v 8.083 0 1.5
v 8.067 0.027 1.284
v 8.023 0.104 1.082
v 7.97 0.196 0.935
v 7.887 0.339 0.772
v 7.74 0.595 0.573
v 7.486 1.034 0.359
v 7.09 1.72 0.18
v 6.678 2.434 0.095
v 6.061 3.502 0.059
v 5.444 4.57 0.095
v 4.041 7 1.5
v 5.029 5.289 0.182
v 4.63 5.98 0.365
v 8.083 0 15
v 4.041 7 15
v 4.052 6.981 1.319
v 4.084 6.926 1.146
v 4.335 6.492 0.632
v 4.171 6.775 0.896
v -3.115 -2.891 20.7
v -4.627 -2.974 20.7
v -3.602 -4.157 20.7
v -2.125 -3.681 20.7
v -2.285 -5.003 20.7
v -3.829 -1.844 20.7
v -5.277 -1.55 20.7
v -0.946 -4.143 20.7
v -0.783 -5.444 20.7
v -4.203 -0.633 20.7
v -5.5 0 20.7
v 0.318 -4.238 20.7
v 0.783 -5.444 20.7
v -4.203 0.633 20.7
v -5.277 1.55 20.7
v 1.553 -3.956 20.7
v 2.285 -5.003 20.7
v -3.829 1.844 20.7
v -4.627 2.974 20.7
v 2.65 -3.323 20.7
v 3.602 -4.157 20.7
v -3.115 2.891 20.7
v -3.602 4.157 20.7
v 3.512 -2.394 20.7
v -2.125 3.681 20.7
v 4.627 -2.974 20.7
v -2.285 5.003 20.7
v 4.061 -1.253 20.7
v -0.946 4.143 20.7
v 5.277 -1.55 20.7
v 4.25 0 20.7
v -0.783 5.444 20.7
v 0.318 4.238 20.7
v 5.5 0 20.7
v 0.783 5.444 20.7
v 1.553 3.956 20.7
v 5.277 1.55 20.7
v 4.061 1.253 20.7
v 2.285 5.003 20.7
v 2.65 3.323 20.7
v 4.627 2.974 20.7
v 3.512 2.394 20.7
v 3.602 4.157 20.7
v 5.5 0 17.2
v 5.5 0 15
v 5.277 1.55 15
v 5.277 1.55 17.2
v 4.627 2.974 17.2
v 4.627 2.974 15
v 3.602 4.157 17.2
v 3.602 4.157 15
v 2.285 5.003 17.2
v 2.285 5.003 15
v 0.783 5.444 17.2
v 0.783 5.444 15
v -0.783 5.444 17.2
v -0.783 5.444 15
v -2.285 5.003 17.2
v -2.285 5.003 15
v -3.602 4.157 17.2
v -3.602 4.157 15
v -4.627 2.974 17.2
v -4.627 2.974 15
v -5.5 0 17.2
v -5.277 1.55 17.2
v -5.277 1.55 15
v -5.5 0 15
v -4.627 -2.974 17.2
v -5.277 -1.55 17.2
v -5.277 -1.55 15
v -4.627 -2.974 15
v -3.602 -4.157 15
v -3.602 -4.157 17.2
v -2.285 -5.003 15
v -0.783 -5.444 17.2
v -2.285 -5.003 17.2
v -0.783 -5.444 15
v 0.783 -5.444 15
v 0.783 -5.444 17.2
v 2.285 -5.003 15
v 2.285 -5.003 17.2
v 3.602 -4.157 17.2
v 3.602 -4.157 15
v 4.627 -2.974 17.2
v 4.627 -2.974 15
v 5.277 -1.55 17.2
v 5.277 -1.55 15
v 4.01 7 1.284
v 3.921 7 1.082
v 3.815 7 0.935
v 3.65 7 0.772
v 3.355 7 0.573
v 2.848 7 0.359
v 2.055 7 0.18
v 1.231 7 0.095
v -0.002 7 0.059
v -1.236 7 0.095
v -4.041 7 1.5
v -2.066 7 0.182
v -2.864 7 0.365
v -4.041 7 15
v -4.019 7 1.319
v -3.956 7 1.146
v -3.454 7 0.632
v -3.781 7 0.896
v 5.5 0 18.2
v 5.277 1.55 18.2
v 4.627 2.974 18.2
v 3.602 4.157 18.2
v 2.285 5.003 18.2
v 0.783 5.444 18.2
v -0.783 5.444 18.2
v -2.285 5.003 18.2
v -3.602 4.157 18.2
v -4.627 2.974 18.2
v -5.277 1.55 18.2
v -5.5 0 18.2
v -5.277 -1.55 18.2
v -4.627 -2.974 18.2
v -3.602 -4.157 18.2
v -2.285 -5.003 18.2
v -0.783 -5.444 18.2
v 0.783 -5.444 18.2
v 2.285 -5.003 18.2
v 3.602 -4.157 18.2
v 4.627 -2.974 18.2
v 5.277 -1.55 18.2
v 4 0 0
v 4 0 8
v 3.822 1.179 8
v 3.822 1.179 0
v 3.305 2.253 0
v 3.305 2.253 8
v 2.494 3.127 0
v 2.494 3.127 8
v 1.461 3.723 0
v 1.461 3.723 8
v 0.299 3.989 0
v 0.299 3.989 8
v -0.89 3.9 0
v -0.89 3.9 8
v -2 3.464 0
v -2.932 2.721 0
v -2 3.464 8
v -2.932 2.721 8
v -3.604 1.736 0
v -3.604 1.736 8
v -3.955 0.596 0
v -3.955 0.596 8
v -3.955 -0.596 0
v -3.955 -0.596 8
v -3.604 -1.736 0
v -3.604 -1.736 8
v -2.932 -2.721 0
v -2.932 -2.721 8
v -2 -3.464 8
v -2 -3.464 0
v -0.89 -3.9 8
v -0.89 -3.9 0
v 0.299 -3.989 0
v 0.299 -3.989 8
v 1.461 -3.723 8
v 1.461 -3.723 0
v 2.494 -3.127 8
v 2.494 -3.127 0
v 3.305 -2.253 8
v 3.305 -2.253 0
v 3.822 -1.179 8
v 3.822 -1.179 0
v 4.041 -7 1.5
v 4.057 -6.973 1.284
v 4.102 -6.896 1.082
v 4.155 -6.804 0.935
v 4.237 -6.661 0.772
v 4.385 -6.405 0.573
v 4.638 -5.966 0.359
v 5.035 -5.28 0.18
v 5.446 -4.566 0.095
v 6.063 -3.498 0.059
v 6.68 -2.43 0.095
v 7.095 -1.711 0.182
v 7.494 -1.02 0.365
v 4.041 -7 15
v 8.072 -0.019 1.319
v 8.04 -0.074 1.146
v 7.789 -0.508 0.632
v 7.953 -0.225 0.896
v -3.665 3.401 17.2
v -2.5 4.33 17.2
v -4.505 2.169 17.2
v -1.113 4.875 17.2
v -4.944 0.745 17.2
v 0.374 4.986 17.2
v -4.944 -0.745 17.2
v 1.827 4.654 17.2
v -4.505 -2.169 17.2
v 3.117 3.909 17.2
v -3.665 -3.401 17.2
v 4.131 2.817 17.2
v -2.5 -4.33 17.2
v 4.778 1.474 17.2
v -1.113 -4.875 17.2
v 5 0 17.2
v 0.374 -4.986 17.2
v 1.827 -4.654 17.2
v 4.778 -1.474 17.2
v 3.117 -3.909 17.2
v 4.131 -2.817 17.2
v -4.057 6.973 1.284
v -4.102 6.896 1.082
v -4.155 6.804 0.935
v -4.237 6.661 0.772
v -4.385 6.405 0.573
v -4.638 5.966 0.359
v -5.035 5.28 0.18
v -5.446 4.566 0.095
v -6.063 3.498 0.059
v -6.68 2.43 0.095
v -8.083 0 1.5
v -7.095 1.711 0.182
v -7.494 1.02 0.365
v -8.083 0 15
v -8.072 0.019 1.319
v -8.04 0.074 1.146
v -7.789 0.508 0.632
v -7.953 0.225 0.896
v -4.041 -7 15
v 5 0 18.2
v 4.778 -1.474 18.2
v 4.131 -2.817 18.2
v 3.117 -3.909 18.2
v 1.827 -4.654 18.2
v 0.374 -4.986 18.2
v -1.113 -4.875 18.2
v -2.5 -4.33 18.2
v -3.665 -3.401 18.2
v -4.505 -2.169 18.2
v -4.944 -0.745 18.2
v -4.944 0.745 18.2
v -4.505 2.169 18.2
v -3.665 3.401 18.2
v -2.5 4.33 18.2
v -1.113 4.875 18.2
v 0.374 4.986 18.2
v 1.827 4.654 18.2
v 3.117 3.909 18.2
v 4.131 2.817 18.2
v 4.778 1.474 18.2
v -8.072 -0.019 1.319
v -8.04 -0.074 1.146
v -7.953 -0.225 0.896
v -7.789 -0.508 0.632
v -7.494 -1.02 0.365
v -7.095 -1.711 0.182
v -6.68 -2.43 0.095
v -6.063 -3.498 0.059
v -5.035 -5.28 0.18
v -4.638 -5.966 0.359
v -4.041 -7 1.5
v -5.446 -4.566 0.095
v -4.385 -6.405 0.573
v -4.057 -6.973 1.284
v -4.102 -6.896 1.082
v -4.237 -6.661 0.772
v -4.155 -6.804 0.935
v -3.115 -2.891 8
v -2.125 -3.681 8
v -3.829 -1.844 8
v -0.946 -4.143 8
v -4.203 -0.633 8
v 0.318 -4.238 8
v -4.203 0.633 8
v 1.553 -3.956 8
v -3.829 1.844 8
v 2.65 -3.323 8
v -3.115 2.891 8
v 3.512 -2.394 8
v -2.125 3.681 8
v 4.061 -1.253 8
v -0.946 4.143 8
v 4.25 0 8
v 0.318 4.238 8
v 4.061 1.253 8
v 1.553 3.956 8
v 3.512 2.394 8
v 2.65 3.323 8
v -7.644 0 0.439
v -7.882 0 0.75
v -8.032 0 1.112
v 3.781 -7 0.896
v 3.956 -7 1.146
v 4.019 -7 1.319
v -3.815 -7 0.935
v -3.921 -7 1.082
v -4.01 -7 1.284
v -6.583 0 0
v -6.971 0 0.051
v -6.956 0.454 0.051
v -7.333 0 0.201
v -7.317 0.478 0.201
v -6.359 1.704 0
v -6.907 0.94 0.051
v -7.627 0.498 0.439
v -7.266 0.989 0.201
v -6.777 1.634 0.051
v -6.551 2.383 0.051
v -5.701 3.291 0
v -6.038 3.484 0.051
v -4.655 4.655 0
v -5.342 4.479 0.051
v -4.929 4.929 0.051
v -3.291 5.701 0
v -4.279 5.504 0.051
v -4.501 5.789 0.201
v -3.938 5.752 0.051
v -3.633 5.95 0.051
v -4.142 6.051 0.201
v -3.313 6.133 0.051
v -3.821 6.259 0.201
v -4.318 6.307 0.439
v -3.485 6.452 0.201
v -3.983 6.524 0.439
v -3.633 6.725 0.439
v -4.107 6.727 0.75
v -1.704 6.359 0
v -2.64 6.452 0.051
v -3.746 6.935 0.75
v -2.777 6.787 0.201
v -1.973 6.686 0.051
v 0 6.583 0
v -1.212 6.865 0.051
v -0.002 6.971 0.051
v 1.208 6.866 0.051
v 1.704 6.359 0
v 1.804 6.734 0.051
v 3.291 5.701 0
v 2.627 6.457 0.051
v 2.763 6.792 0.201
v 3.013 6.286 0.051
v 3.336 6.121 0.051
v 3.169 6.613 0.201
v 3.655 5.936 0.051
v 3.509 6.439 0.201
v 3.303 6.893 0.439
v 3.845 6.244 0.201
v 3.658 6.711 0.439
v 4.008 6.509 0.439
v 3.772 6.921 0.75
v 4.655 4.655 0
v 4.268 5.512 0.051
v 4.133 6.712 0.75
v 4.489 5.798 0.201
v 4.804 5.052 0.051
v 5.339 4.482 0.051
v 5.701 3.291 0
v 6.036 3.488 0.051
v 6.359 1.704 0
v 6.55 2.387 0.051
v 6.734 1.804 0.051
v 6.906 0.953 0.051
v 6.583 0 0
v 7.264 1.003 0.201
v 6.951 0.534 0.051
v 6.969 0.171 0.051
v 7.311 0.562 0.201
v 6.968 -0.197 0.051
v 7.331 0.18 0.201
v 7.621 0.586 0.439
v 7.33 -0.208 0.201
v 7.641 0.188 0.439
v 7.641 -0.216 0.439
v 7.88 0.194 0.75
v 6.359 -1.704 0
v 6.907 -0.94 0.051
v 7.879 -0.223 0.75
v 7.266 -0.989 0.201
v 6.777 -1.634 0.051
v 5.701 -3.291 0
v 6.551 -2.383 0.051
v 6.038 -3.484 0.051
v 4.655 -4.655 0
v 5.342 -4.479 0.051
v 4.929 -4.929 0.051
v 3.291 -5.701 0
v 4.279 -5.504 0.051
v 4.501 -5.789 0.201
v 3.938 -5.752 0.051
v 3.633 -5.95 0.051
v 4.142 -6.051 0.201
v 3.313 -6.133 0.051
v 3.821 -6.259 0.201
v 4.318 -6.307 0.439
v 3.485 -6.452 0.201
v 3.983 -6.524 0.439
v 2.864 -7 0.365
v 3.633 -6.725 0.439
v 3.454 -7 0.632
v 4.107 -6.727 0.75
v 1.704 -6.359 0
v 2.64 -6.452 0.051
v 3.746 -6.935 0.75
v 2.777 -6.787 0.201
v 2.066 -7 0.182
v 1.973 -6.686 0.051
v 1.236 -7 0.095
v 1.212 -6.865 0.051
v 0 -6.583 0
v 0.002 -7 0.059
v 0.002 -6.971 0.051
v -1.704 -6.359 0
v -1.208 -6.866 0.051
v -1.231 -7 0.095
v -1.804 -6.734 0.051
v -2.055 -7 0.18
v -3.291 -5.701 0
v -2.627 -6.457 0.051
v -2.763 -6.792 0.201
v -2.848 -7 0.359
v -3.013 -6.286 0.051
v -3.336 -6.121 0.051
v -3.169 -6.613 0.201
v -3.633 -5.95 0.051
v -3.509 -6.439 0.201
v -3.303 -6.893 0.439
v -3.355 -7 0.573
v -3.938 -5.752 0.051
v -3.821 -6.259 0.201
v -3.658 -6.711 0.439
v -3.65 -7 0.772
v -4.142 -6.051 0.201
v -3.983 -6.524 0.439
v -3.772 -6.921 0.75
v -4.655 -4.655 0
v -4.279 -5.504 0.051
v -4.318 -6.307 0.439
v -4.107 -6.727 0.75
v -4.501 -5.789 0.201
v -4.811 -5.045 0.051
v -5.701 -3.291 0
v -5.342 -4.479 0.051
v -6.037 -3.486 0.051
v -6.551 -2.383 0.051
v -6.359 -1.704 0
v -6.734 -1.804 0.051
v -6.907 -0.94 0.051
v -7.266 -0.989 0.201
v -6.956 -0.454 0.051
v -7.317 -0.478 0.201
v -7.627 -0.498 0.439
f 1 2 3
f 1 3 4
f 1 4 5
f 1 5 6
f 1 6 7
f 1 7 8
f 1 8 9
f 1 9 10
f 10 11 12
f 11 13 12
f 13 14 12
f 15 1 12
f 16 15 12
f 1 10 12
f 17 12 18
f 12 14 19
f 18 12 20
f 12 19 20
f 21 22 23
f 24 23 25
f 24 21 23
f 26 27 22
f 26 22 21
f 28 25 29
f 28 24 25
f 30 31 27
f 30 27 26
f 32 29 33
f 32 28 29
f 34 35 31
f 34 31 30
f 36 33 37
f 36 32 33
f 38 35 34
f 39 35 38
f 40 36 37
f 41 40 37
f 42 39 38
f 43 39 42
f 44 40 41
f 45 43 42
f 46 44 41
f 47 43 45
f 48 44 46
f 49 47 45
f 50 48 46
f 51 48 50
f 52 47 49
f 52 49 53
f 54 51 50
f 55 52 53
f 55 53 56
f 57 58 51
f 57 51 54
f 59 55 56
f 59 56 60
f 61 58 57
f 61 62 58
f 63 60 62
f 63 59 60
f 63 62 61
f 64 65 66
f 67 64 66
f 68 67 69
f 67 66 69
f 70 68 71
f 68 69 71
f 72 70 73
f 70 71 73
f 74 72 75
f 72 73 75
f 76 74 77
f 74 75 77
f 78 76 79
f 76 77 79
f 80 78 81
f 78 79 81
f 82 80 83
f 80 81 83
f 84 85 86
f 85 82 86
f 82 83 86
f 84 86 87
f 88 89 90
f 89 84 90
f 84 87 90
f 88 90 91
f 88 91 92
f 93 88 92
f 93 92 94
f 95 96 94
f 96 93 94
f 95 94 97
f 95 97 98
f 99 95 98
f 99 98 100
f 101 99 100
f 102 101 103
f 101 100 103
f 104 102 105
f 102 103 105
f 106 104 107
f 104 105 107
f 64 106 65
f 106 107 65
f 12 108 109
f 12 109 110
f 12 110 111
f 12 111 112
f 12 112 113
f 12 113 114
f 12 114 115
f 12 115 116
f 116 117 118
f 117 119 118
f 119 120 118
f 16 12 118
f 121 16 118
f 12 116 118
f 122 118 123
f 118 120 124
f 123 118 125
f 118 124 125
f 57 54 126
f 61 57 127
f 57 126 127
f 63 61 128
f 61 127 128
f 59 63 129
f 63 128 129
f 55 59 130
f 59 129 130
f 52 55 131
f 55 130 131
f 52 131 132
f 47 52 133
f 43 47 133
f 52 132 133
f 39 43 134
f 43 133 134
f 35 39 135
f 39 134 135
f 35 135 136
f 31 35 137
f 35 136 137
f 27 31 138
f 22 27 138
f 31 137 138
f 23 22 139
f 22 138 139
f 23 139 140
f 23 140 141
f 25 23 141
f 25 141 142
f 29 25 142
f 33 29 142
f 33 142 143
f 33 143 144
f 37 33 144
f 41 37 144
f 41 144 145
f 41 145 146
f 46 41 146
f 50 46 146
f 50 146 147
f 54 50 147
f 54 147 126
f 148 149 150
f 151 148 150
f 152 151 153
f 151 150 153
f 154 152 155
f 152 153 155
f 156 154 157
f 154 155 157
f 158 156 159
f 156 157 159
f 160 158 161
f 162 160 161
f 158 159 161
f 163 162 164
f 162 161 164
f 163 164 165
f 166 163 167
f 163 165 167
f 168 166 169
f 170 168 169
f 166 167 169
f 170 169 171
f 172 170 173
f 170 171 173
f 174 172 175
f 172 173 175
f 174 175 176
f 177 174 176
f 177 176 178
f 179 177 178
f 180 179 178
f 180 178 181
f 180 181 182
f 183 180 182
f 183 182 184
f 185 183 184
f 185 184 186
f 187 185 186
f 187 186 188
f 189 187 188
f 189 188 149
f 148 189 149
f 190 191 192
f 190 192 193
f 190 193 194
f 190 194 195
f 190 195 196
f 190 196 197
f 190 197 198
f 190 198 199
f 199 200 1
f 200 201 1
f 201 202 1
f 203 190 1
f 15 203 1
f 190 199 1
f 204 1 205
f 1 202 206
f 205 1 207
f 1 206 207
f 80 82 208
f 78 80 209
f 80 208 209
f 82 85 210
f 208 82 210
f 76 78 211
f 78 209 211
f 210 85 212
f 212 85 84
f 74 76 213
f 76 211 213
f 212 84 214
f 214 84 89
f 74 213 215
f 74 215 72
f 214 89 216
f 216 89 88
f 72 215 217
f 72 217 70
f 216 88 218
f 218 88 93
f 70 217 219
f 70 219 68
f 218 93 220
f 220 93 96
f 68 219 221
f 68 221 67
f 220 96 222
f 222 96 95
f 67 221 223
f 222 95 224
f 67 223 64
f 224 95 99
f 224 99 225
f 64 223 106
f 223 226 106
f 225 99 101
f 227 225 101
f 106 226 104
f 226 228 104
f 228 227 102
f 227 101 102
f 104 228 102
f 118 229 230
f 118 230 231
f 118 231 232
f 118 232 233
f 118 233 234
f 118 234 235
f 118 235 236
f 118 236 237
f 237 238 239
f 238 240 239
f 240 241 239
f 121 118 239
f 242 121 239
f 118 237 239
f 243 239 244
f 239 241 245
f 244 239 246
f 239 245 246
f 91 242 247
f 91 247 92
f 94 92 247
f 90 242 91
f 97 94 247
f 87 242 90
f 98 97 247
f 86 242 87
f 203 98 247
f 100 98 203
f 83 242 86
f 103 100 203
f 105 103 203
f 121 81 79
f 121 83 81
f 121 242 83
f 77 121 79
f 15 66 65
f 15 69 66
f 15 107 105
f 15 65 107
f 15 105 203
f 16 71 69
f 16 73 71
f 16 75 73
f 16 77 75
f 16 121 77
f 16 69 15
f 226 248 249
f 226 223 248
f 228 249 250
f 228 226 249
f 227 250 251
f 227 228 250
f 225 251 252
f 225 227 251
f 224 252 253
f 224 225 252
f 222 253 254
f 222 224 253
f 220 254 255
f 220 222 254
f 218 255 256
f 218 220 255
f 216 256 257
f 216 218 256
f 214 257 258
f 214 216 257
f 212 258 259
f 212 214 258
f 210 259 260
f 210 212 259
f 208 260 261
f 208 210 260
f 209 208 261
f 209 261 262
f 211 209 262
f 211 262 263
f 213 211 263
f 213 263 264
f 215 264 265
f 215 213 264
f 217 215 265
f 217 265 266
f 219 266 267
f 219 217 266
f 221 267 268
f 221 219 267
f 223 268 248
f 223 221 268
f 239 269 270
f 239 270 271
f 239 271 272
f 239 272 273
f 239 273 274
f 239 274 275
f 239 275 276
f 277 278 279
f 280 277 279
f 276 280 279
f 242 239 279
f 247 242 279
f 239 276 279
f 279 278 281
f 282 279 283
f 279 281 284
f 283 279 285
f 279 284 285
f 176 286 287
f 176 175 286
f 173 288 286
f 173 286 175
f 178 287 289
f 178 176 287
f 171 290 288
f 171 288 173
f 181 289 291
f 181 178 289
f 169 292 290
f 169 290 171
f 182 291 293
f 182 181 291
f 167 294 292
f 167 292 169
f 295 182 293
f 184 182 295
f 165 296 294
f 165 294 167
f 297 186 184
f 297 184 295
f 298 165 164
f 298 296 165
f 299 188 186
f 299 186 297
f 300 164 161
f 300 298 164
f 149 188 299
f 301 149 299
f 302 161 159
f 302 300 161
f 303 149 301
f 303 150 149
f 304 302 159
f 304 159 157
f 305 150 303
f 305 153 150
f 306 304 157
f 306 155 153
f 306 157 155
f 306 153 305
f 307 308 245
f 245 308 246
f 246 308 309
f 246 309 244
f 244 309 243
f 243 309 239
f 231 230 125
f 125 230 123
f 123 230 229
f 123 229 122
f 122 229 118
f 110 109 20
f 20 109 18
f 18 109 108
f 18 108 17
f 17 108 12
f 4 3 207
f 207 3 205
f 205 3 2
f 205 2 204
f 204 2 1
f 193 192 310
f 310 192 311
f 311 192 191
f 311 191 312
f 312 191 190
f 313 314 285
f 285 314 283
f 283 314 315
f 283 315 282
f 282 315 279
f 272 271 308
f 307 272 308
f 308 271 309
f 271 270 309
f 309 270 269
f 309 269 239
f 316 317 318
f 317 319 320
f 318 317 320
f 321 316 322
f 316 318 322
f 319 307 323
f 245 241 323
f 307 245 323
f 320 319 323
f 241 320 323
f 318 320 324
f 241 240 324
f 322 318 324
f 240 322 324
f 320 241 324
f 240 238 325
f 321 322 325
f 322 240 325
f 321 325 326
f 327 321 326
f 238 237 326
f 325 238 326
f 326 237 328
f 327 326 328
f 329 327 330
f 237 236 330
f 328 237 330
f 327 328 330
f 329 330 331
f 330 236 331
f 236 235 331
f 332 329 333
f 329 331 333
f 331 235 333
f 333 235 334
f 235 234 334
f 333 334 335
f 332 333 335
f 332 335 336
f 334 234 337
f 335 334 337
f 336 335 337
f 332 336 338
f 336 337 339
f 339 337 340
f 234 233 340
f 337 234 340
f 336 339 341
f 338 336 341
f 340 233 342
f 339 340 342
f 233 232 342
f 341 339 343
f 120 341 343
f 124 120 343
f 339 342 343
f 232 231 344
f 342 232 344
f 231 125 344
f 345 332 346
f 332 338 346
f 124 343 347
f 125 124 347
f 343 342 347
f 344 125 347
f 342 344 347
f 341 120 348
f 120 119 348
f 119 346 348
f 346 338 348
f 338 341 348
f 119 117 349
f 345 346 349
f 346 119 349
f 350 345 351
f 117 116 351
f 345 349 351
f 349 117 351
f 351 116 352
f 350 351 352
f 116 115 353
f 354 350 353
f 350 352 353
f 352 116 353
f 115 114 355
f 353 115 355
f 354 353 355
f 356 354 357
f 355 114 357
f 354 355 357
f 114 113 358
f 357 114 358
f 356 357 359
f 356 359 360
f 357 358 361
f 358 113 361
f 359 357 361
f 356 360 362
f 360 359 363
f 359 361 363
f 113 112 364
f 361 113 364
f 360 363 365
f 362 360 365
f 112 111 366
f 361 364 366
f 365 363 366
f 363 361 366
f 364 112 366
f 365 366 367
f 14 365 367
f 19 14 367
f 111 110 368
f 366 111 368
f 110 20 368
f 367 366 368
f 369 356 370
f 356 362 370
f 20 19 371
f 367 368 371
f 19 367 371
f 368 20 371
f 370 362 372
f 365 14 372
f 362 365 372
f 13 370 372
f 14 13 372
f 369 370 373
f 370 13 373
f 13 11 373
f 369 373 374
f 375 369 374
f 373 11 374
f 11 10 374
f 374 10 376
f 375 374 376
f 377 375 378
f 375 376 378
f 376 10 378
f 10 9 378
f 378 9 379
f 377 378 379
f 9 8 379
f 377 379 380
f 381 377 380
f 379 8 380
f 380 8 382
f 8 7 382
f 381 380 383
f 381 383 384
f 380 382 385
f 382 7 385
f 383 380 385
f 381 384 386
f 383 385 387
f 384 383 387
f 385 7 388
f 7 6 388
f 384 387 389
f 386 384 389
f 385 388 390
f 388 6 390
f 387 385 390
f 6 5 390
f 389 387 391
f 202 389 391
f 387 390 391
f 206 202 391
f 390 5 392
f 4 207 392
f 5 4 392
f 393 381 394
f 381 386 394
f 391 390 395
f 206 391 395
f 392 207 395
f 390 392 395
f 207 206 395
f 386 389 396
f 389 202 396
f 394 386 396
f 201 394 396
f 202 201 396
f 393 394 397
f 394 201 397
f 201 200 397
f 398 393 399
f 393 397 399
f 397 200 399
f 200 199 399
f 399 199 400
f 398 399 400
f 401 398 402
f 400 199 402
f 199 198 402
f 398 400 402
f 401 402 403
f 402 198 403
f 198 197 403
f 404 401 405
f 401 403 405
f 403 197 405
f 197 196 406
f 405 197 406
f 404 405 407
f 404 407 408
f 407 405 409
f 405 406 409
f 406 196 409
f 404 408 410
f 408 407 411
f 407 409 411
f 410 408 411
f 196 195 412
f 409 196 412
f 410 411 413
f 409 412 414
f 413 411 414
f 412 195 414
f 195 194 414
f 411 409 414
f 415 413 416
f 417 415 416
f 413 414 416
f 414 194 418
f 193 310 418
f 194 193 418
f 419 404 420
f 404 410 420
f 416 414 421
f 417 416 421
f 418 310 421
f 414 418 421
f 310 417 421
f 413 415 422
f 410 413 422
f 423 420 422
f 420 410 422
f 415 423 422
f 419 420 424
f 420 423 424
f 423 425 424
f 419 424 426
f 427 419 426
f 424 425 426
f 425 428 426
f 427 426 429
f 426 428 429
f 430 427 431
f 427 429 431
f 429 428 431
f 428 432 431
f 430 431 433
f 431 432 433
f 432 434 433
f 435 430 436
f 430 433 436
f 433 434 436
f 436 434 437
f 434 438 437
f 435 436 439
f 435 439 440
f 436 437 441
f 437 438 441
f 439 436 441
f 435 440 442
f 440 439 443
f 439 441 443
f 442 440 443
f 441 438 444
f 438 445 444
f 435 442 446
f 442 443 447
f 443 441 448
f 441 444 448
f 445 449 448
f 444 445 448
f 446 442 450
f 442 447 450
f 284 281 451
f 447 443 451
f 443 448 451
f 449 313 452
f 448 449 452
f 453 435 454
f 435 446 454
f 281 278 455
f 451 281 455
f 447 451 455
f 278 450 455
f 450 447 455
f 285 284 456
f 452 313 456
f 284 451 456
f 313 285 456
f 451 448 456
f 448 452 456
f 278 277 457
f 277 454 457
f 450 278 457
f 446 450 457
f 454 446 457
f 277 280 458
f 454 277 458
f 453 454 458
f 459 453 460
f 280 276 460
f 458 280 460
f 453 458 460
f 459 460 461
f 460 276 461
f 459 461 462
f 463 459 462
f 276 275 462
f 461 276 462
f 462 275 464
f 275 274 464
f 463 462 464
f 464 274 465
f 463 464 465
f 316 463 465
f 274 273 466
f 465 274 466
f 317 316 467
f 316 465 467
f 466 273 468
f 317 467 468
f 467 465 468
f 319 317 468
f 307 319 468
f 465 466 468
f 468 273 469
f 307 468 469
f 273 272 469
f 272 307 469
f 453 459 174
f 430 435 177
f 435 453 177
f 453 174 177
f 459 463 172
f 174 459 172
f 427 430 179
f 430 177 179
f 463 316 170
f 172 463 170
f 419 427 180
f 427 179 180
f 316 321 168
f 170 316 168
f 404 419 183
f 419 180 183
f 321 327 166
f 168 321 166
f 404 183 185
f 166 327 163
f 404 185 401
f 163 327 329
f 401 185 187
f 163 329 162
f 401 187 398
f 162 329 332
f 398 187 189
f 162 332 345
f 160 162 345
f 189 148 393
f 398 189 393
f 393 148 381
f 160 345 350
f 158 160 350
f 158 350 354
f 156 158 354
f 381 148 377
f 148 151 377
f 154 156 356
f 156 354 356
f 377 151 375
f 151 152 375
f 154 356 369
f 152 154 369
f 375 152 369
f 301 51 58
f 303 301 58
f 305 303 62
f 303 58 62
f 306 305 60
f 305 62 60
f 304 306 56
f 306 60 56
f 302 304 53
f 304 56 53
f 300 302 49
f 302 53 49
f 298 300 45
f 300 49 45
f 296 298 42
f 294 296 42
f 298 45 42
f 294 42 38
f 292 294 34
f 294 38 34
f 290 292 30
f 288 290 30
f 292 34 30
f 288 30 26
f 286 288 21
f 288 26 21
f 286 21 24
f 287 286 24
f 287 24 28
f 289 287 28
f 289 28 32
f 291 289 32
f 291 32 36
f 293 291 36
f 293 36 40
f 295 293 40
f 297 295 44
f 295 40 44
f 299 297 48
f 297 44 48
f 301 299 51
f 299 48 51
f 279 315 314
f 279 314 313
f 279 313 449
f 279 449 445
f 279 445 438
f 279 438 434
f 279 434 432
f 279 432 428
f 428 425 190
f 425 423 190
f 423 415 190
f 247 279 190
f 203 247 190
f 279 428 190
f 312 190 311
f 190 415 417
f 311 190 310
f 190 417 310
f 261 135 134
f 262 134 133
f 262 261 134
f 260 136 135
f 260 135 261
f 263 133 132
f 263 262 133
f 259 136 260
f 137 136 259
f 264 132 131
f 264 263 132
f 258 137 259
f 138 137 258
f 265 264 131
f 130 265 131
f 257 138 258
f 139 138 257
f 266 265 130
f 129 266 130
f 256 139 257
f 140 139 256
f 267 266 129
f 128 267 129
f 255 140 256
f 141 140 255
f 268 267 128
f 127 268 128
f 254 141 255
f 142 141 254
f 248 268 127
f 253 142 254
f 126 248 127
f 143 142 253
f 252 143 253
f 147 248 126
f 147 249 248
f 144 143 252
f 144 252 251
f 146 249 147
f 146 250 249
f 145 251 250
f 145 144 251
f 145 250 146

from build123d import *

# Parameters (mm, degrees)
EXTRUDE_1_DEPTH     = 15
SKETCH_2_R          = 5.5
EXTRUDE_2_DEPTH     = 5.7
SKETCH_3_R          = 4.25
CUT_EXTRUDE_1_DEPTH = 12.7
M8X1_25_1_D         = 8
SKETCH_8_W          = 0.5
SKETCH_8_H          = 1


with BuildPart() as part:
    # 草图1 → 凸台-拉伸1 (new body)
    with BuildSketch(Plane.XY):
        Polygon((-8.082903769, 0), (-4.041451884, -7), (4.041451884, -7), (8.082903769, 0), (4.041451884, 7), (-4.041451884, 7), align=None)
    extrude(amount=EXTRUDE_1_DEPTH)

    # 草图2 → 凸台-拉伸2 (add)
    with BuildSketch(Plane.XY.offset(15)):
        Circle(SKETCH_2_R)
    extrude(amount=EXTRUDE_2_DEPTH)

    # 草图3 → 切除-拉伸1 (cut)
    with BuildSketch(Plane.XY.offset(20.7)):
        Circle(SKETCH_3_R)
    extrude(amount=-CUT_EXTRUDE_1_DEPTH, mode=Mode.SUBTRACT)

    # M8x1.25 螺纹孔1 (through all)
    with Locations(Plane(origin=(0, 0, 0), x_dir=(-1, 0, 0), z_dir=(0, 0, -1))):
        with Locations((0, 0)):
            Hole(M8X1_25_1_D / 2)

    # 草图8 → 切除-旋转1 (revolve, cut)
    with BuildSketch(Plane(origin=(0, 0, 0), x_dir=(1, 0, 0), z_dir=(0, 1, 0)), mode=Mode.PRIVATE) as cut_revolve_1_sk:
        with Locations((-5.25, -17.7)):
            Rectangle(SKETCH_8_W, SKETCH_8_H)
    revolve(cut_revolve_1_sk.sketch.rotate(Axis((0, 0, 8), (0, 0, -1)), 180), axis=Axis((0, 0, 8), (0, 0, -1)), mode=Mode.SUBTRACT)

    # 草图9 → 切除-旋转2 (revolve, cut)
    with BuildSketch(Plane(origin=(0, 0, 0), x_dir=(1, 0, 0), z_dir=(0, 1, 0))):
        with BuildLine():
            Line((-8.082903769, -1.5), (-8.082903769, 0))
            Line((-8.082903769, 0), (-6.582903769, 0))
            ThreePointArc((-6.582903769, 0), (-7.64356394, -0.439339828), (-8.082903769, -1.5))
        make_face()
    revolve(axis=Axis((0, 0, 8), (0, 0, -1)), mode=Mode.SUBTRACT)


solid = part.part
